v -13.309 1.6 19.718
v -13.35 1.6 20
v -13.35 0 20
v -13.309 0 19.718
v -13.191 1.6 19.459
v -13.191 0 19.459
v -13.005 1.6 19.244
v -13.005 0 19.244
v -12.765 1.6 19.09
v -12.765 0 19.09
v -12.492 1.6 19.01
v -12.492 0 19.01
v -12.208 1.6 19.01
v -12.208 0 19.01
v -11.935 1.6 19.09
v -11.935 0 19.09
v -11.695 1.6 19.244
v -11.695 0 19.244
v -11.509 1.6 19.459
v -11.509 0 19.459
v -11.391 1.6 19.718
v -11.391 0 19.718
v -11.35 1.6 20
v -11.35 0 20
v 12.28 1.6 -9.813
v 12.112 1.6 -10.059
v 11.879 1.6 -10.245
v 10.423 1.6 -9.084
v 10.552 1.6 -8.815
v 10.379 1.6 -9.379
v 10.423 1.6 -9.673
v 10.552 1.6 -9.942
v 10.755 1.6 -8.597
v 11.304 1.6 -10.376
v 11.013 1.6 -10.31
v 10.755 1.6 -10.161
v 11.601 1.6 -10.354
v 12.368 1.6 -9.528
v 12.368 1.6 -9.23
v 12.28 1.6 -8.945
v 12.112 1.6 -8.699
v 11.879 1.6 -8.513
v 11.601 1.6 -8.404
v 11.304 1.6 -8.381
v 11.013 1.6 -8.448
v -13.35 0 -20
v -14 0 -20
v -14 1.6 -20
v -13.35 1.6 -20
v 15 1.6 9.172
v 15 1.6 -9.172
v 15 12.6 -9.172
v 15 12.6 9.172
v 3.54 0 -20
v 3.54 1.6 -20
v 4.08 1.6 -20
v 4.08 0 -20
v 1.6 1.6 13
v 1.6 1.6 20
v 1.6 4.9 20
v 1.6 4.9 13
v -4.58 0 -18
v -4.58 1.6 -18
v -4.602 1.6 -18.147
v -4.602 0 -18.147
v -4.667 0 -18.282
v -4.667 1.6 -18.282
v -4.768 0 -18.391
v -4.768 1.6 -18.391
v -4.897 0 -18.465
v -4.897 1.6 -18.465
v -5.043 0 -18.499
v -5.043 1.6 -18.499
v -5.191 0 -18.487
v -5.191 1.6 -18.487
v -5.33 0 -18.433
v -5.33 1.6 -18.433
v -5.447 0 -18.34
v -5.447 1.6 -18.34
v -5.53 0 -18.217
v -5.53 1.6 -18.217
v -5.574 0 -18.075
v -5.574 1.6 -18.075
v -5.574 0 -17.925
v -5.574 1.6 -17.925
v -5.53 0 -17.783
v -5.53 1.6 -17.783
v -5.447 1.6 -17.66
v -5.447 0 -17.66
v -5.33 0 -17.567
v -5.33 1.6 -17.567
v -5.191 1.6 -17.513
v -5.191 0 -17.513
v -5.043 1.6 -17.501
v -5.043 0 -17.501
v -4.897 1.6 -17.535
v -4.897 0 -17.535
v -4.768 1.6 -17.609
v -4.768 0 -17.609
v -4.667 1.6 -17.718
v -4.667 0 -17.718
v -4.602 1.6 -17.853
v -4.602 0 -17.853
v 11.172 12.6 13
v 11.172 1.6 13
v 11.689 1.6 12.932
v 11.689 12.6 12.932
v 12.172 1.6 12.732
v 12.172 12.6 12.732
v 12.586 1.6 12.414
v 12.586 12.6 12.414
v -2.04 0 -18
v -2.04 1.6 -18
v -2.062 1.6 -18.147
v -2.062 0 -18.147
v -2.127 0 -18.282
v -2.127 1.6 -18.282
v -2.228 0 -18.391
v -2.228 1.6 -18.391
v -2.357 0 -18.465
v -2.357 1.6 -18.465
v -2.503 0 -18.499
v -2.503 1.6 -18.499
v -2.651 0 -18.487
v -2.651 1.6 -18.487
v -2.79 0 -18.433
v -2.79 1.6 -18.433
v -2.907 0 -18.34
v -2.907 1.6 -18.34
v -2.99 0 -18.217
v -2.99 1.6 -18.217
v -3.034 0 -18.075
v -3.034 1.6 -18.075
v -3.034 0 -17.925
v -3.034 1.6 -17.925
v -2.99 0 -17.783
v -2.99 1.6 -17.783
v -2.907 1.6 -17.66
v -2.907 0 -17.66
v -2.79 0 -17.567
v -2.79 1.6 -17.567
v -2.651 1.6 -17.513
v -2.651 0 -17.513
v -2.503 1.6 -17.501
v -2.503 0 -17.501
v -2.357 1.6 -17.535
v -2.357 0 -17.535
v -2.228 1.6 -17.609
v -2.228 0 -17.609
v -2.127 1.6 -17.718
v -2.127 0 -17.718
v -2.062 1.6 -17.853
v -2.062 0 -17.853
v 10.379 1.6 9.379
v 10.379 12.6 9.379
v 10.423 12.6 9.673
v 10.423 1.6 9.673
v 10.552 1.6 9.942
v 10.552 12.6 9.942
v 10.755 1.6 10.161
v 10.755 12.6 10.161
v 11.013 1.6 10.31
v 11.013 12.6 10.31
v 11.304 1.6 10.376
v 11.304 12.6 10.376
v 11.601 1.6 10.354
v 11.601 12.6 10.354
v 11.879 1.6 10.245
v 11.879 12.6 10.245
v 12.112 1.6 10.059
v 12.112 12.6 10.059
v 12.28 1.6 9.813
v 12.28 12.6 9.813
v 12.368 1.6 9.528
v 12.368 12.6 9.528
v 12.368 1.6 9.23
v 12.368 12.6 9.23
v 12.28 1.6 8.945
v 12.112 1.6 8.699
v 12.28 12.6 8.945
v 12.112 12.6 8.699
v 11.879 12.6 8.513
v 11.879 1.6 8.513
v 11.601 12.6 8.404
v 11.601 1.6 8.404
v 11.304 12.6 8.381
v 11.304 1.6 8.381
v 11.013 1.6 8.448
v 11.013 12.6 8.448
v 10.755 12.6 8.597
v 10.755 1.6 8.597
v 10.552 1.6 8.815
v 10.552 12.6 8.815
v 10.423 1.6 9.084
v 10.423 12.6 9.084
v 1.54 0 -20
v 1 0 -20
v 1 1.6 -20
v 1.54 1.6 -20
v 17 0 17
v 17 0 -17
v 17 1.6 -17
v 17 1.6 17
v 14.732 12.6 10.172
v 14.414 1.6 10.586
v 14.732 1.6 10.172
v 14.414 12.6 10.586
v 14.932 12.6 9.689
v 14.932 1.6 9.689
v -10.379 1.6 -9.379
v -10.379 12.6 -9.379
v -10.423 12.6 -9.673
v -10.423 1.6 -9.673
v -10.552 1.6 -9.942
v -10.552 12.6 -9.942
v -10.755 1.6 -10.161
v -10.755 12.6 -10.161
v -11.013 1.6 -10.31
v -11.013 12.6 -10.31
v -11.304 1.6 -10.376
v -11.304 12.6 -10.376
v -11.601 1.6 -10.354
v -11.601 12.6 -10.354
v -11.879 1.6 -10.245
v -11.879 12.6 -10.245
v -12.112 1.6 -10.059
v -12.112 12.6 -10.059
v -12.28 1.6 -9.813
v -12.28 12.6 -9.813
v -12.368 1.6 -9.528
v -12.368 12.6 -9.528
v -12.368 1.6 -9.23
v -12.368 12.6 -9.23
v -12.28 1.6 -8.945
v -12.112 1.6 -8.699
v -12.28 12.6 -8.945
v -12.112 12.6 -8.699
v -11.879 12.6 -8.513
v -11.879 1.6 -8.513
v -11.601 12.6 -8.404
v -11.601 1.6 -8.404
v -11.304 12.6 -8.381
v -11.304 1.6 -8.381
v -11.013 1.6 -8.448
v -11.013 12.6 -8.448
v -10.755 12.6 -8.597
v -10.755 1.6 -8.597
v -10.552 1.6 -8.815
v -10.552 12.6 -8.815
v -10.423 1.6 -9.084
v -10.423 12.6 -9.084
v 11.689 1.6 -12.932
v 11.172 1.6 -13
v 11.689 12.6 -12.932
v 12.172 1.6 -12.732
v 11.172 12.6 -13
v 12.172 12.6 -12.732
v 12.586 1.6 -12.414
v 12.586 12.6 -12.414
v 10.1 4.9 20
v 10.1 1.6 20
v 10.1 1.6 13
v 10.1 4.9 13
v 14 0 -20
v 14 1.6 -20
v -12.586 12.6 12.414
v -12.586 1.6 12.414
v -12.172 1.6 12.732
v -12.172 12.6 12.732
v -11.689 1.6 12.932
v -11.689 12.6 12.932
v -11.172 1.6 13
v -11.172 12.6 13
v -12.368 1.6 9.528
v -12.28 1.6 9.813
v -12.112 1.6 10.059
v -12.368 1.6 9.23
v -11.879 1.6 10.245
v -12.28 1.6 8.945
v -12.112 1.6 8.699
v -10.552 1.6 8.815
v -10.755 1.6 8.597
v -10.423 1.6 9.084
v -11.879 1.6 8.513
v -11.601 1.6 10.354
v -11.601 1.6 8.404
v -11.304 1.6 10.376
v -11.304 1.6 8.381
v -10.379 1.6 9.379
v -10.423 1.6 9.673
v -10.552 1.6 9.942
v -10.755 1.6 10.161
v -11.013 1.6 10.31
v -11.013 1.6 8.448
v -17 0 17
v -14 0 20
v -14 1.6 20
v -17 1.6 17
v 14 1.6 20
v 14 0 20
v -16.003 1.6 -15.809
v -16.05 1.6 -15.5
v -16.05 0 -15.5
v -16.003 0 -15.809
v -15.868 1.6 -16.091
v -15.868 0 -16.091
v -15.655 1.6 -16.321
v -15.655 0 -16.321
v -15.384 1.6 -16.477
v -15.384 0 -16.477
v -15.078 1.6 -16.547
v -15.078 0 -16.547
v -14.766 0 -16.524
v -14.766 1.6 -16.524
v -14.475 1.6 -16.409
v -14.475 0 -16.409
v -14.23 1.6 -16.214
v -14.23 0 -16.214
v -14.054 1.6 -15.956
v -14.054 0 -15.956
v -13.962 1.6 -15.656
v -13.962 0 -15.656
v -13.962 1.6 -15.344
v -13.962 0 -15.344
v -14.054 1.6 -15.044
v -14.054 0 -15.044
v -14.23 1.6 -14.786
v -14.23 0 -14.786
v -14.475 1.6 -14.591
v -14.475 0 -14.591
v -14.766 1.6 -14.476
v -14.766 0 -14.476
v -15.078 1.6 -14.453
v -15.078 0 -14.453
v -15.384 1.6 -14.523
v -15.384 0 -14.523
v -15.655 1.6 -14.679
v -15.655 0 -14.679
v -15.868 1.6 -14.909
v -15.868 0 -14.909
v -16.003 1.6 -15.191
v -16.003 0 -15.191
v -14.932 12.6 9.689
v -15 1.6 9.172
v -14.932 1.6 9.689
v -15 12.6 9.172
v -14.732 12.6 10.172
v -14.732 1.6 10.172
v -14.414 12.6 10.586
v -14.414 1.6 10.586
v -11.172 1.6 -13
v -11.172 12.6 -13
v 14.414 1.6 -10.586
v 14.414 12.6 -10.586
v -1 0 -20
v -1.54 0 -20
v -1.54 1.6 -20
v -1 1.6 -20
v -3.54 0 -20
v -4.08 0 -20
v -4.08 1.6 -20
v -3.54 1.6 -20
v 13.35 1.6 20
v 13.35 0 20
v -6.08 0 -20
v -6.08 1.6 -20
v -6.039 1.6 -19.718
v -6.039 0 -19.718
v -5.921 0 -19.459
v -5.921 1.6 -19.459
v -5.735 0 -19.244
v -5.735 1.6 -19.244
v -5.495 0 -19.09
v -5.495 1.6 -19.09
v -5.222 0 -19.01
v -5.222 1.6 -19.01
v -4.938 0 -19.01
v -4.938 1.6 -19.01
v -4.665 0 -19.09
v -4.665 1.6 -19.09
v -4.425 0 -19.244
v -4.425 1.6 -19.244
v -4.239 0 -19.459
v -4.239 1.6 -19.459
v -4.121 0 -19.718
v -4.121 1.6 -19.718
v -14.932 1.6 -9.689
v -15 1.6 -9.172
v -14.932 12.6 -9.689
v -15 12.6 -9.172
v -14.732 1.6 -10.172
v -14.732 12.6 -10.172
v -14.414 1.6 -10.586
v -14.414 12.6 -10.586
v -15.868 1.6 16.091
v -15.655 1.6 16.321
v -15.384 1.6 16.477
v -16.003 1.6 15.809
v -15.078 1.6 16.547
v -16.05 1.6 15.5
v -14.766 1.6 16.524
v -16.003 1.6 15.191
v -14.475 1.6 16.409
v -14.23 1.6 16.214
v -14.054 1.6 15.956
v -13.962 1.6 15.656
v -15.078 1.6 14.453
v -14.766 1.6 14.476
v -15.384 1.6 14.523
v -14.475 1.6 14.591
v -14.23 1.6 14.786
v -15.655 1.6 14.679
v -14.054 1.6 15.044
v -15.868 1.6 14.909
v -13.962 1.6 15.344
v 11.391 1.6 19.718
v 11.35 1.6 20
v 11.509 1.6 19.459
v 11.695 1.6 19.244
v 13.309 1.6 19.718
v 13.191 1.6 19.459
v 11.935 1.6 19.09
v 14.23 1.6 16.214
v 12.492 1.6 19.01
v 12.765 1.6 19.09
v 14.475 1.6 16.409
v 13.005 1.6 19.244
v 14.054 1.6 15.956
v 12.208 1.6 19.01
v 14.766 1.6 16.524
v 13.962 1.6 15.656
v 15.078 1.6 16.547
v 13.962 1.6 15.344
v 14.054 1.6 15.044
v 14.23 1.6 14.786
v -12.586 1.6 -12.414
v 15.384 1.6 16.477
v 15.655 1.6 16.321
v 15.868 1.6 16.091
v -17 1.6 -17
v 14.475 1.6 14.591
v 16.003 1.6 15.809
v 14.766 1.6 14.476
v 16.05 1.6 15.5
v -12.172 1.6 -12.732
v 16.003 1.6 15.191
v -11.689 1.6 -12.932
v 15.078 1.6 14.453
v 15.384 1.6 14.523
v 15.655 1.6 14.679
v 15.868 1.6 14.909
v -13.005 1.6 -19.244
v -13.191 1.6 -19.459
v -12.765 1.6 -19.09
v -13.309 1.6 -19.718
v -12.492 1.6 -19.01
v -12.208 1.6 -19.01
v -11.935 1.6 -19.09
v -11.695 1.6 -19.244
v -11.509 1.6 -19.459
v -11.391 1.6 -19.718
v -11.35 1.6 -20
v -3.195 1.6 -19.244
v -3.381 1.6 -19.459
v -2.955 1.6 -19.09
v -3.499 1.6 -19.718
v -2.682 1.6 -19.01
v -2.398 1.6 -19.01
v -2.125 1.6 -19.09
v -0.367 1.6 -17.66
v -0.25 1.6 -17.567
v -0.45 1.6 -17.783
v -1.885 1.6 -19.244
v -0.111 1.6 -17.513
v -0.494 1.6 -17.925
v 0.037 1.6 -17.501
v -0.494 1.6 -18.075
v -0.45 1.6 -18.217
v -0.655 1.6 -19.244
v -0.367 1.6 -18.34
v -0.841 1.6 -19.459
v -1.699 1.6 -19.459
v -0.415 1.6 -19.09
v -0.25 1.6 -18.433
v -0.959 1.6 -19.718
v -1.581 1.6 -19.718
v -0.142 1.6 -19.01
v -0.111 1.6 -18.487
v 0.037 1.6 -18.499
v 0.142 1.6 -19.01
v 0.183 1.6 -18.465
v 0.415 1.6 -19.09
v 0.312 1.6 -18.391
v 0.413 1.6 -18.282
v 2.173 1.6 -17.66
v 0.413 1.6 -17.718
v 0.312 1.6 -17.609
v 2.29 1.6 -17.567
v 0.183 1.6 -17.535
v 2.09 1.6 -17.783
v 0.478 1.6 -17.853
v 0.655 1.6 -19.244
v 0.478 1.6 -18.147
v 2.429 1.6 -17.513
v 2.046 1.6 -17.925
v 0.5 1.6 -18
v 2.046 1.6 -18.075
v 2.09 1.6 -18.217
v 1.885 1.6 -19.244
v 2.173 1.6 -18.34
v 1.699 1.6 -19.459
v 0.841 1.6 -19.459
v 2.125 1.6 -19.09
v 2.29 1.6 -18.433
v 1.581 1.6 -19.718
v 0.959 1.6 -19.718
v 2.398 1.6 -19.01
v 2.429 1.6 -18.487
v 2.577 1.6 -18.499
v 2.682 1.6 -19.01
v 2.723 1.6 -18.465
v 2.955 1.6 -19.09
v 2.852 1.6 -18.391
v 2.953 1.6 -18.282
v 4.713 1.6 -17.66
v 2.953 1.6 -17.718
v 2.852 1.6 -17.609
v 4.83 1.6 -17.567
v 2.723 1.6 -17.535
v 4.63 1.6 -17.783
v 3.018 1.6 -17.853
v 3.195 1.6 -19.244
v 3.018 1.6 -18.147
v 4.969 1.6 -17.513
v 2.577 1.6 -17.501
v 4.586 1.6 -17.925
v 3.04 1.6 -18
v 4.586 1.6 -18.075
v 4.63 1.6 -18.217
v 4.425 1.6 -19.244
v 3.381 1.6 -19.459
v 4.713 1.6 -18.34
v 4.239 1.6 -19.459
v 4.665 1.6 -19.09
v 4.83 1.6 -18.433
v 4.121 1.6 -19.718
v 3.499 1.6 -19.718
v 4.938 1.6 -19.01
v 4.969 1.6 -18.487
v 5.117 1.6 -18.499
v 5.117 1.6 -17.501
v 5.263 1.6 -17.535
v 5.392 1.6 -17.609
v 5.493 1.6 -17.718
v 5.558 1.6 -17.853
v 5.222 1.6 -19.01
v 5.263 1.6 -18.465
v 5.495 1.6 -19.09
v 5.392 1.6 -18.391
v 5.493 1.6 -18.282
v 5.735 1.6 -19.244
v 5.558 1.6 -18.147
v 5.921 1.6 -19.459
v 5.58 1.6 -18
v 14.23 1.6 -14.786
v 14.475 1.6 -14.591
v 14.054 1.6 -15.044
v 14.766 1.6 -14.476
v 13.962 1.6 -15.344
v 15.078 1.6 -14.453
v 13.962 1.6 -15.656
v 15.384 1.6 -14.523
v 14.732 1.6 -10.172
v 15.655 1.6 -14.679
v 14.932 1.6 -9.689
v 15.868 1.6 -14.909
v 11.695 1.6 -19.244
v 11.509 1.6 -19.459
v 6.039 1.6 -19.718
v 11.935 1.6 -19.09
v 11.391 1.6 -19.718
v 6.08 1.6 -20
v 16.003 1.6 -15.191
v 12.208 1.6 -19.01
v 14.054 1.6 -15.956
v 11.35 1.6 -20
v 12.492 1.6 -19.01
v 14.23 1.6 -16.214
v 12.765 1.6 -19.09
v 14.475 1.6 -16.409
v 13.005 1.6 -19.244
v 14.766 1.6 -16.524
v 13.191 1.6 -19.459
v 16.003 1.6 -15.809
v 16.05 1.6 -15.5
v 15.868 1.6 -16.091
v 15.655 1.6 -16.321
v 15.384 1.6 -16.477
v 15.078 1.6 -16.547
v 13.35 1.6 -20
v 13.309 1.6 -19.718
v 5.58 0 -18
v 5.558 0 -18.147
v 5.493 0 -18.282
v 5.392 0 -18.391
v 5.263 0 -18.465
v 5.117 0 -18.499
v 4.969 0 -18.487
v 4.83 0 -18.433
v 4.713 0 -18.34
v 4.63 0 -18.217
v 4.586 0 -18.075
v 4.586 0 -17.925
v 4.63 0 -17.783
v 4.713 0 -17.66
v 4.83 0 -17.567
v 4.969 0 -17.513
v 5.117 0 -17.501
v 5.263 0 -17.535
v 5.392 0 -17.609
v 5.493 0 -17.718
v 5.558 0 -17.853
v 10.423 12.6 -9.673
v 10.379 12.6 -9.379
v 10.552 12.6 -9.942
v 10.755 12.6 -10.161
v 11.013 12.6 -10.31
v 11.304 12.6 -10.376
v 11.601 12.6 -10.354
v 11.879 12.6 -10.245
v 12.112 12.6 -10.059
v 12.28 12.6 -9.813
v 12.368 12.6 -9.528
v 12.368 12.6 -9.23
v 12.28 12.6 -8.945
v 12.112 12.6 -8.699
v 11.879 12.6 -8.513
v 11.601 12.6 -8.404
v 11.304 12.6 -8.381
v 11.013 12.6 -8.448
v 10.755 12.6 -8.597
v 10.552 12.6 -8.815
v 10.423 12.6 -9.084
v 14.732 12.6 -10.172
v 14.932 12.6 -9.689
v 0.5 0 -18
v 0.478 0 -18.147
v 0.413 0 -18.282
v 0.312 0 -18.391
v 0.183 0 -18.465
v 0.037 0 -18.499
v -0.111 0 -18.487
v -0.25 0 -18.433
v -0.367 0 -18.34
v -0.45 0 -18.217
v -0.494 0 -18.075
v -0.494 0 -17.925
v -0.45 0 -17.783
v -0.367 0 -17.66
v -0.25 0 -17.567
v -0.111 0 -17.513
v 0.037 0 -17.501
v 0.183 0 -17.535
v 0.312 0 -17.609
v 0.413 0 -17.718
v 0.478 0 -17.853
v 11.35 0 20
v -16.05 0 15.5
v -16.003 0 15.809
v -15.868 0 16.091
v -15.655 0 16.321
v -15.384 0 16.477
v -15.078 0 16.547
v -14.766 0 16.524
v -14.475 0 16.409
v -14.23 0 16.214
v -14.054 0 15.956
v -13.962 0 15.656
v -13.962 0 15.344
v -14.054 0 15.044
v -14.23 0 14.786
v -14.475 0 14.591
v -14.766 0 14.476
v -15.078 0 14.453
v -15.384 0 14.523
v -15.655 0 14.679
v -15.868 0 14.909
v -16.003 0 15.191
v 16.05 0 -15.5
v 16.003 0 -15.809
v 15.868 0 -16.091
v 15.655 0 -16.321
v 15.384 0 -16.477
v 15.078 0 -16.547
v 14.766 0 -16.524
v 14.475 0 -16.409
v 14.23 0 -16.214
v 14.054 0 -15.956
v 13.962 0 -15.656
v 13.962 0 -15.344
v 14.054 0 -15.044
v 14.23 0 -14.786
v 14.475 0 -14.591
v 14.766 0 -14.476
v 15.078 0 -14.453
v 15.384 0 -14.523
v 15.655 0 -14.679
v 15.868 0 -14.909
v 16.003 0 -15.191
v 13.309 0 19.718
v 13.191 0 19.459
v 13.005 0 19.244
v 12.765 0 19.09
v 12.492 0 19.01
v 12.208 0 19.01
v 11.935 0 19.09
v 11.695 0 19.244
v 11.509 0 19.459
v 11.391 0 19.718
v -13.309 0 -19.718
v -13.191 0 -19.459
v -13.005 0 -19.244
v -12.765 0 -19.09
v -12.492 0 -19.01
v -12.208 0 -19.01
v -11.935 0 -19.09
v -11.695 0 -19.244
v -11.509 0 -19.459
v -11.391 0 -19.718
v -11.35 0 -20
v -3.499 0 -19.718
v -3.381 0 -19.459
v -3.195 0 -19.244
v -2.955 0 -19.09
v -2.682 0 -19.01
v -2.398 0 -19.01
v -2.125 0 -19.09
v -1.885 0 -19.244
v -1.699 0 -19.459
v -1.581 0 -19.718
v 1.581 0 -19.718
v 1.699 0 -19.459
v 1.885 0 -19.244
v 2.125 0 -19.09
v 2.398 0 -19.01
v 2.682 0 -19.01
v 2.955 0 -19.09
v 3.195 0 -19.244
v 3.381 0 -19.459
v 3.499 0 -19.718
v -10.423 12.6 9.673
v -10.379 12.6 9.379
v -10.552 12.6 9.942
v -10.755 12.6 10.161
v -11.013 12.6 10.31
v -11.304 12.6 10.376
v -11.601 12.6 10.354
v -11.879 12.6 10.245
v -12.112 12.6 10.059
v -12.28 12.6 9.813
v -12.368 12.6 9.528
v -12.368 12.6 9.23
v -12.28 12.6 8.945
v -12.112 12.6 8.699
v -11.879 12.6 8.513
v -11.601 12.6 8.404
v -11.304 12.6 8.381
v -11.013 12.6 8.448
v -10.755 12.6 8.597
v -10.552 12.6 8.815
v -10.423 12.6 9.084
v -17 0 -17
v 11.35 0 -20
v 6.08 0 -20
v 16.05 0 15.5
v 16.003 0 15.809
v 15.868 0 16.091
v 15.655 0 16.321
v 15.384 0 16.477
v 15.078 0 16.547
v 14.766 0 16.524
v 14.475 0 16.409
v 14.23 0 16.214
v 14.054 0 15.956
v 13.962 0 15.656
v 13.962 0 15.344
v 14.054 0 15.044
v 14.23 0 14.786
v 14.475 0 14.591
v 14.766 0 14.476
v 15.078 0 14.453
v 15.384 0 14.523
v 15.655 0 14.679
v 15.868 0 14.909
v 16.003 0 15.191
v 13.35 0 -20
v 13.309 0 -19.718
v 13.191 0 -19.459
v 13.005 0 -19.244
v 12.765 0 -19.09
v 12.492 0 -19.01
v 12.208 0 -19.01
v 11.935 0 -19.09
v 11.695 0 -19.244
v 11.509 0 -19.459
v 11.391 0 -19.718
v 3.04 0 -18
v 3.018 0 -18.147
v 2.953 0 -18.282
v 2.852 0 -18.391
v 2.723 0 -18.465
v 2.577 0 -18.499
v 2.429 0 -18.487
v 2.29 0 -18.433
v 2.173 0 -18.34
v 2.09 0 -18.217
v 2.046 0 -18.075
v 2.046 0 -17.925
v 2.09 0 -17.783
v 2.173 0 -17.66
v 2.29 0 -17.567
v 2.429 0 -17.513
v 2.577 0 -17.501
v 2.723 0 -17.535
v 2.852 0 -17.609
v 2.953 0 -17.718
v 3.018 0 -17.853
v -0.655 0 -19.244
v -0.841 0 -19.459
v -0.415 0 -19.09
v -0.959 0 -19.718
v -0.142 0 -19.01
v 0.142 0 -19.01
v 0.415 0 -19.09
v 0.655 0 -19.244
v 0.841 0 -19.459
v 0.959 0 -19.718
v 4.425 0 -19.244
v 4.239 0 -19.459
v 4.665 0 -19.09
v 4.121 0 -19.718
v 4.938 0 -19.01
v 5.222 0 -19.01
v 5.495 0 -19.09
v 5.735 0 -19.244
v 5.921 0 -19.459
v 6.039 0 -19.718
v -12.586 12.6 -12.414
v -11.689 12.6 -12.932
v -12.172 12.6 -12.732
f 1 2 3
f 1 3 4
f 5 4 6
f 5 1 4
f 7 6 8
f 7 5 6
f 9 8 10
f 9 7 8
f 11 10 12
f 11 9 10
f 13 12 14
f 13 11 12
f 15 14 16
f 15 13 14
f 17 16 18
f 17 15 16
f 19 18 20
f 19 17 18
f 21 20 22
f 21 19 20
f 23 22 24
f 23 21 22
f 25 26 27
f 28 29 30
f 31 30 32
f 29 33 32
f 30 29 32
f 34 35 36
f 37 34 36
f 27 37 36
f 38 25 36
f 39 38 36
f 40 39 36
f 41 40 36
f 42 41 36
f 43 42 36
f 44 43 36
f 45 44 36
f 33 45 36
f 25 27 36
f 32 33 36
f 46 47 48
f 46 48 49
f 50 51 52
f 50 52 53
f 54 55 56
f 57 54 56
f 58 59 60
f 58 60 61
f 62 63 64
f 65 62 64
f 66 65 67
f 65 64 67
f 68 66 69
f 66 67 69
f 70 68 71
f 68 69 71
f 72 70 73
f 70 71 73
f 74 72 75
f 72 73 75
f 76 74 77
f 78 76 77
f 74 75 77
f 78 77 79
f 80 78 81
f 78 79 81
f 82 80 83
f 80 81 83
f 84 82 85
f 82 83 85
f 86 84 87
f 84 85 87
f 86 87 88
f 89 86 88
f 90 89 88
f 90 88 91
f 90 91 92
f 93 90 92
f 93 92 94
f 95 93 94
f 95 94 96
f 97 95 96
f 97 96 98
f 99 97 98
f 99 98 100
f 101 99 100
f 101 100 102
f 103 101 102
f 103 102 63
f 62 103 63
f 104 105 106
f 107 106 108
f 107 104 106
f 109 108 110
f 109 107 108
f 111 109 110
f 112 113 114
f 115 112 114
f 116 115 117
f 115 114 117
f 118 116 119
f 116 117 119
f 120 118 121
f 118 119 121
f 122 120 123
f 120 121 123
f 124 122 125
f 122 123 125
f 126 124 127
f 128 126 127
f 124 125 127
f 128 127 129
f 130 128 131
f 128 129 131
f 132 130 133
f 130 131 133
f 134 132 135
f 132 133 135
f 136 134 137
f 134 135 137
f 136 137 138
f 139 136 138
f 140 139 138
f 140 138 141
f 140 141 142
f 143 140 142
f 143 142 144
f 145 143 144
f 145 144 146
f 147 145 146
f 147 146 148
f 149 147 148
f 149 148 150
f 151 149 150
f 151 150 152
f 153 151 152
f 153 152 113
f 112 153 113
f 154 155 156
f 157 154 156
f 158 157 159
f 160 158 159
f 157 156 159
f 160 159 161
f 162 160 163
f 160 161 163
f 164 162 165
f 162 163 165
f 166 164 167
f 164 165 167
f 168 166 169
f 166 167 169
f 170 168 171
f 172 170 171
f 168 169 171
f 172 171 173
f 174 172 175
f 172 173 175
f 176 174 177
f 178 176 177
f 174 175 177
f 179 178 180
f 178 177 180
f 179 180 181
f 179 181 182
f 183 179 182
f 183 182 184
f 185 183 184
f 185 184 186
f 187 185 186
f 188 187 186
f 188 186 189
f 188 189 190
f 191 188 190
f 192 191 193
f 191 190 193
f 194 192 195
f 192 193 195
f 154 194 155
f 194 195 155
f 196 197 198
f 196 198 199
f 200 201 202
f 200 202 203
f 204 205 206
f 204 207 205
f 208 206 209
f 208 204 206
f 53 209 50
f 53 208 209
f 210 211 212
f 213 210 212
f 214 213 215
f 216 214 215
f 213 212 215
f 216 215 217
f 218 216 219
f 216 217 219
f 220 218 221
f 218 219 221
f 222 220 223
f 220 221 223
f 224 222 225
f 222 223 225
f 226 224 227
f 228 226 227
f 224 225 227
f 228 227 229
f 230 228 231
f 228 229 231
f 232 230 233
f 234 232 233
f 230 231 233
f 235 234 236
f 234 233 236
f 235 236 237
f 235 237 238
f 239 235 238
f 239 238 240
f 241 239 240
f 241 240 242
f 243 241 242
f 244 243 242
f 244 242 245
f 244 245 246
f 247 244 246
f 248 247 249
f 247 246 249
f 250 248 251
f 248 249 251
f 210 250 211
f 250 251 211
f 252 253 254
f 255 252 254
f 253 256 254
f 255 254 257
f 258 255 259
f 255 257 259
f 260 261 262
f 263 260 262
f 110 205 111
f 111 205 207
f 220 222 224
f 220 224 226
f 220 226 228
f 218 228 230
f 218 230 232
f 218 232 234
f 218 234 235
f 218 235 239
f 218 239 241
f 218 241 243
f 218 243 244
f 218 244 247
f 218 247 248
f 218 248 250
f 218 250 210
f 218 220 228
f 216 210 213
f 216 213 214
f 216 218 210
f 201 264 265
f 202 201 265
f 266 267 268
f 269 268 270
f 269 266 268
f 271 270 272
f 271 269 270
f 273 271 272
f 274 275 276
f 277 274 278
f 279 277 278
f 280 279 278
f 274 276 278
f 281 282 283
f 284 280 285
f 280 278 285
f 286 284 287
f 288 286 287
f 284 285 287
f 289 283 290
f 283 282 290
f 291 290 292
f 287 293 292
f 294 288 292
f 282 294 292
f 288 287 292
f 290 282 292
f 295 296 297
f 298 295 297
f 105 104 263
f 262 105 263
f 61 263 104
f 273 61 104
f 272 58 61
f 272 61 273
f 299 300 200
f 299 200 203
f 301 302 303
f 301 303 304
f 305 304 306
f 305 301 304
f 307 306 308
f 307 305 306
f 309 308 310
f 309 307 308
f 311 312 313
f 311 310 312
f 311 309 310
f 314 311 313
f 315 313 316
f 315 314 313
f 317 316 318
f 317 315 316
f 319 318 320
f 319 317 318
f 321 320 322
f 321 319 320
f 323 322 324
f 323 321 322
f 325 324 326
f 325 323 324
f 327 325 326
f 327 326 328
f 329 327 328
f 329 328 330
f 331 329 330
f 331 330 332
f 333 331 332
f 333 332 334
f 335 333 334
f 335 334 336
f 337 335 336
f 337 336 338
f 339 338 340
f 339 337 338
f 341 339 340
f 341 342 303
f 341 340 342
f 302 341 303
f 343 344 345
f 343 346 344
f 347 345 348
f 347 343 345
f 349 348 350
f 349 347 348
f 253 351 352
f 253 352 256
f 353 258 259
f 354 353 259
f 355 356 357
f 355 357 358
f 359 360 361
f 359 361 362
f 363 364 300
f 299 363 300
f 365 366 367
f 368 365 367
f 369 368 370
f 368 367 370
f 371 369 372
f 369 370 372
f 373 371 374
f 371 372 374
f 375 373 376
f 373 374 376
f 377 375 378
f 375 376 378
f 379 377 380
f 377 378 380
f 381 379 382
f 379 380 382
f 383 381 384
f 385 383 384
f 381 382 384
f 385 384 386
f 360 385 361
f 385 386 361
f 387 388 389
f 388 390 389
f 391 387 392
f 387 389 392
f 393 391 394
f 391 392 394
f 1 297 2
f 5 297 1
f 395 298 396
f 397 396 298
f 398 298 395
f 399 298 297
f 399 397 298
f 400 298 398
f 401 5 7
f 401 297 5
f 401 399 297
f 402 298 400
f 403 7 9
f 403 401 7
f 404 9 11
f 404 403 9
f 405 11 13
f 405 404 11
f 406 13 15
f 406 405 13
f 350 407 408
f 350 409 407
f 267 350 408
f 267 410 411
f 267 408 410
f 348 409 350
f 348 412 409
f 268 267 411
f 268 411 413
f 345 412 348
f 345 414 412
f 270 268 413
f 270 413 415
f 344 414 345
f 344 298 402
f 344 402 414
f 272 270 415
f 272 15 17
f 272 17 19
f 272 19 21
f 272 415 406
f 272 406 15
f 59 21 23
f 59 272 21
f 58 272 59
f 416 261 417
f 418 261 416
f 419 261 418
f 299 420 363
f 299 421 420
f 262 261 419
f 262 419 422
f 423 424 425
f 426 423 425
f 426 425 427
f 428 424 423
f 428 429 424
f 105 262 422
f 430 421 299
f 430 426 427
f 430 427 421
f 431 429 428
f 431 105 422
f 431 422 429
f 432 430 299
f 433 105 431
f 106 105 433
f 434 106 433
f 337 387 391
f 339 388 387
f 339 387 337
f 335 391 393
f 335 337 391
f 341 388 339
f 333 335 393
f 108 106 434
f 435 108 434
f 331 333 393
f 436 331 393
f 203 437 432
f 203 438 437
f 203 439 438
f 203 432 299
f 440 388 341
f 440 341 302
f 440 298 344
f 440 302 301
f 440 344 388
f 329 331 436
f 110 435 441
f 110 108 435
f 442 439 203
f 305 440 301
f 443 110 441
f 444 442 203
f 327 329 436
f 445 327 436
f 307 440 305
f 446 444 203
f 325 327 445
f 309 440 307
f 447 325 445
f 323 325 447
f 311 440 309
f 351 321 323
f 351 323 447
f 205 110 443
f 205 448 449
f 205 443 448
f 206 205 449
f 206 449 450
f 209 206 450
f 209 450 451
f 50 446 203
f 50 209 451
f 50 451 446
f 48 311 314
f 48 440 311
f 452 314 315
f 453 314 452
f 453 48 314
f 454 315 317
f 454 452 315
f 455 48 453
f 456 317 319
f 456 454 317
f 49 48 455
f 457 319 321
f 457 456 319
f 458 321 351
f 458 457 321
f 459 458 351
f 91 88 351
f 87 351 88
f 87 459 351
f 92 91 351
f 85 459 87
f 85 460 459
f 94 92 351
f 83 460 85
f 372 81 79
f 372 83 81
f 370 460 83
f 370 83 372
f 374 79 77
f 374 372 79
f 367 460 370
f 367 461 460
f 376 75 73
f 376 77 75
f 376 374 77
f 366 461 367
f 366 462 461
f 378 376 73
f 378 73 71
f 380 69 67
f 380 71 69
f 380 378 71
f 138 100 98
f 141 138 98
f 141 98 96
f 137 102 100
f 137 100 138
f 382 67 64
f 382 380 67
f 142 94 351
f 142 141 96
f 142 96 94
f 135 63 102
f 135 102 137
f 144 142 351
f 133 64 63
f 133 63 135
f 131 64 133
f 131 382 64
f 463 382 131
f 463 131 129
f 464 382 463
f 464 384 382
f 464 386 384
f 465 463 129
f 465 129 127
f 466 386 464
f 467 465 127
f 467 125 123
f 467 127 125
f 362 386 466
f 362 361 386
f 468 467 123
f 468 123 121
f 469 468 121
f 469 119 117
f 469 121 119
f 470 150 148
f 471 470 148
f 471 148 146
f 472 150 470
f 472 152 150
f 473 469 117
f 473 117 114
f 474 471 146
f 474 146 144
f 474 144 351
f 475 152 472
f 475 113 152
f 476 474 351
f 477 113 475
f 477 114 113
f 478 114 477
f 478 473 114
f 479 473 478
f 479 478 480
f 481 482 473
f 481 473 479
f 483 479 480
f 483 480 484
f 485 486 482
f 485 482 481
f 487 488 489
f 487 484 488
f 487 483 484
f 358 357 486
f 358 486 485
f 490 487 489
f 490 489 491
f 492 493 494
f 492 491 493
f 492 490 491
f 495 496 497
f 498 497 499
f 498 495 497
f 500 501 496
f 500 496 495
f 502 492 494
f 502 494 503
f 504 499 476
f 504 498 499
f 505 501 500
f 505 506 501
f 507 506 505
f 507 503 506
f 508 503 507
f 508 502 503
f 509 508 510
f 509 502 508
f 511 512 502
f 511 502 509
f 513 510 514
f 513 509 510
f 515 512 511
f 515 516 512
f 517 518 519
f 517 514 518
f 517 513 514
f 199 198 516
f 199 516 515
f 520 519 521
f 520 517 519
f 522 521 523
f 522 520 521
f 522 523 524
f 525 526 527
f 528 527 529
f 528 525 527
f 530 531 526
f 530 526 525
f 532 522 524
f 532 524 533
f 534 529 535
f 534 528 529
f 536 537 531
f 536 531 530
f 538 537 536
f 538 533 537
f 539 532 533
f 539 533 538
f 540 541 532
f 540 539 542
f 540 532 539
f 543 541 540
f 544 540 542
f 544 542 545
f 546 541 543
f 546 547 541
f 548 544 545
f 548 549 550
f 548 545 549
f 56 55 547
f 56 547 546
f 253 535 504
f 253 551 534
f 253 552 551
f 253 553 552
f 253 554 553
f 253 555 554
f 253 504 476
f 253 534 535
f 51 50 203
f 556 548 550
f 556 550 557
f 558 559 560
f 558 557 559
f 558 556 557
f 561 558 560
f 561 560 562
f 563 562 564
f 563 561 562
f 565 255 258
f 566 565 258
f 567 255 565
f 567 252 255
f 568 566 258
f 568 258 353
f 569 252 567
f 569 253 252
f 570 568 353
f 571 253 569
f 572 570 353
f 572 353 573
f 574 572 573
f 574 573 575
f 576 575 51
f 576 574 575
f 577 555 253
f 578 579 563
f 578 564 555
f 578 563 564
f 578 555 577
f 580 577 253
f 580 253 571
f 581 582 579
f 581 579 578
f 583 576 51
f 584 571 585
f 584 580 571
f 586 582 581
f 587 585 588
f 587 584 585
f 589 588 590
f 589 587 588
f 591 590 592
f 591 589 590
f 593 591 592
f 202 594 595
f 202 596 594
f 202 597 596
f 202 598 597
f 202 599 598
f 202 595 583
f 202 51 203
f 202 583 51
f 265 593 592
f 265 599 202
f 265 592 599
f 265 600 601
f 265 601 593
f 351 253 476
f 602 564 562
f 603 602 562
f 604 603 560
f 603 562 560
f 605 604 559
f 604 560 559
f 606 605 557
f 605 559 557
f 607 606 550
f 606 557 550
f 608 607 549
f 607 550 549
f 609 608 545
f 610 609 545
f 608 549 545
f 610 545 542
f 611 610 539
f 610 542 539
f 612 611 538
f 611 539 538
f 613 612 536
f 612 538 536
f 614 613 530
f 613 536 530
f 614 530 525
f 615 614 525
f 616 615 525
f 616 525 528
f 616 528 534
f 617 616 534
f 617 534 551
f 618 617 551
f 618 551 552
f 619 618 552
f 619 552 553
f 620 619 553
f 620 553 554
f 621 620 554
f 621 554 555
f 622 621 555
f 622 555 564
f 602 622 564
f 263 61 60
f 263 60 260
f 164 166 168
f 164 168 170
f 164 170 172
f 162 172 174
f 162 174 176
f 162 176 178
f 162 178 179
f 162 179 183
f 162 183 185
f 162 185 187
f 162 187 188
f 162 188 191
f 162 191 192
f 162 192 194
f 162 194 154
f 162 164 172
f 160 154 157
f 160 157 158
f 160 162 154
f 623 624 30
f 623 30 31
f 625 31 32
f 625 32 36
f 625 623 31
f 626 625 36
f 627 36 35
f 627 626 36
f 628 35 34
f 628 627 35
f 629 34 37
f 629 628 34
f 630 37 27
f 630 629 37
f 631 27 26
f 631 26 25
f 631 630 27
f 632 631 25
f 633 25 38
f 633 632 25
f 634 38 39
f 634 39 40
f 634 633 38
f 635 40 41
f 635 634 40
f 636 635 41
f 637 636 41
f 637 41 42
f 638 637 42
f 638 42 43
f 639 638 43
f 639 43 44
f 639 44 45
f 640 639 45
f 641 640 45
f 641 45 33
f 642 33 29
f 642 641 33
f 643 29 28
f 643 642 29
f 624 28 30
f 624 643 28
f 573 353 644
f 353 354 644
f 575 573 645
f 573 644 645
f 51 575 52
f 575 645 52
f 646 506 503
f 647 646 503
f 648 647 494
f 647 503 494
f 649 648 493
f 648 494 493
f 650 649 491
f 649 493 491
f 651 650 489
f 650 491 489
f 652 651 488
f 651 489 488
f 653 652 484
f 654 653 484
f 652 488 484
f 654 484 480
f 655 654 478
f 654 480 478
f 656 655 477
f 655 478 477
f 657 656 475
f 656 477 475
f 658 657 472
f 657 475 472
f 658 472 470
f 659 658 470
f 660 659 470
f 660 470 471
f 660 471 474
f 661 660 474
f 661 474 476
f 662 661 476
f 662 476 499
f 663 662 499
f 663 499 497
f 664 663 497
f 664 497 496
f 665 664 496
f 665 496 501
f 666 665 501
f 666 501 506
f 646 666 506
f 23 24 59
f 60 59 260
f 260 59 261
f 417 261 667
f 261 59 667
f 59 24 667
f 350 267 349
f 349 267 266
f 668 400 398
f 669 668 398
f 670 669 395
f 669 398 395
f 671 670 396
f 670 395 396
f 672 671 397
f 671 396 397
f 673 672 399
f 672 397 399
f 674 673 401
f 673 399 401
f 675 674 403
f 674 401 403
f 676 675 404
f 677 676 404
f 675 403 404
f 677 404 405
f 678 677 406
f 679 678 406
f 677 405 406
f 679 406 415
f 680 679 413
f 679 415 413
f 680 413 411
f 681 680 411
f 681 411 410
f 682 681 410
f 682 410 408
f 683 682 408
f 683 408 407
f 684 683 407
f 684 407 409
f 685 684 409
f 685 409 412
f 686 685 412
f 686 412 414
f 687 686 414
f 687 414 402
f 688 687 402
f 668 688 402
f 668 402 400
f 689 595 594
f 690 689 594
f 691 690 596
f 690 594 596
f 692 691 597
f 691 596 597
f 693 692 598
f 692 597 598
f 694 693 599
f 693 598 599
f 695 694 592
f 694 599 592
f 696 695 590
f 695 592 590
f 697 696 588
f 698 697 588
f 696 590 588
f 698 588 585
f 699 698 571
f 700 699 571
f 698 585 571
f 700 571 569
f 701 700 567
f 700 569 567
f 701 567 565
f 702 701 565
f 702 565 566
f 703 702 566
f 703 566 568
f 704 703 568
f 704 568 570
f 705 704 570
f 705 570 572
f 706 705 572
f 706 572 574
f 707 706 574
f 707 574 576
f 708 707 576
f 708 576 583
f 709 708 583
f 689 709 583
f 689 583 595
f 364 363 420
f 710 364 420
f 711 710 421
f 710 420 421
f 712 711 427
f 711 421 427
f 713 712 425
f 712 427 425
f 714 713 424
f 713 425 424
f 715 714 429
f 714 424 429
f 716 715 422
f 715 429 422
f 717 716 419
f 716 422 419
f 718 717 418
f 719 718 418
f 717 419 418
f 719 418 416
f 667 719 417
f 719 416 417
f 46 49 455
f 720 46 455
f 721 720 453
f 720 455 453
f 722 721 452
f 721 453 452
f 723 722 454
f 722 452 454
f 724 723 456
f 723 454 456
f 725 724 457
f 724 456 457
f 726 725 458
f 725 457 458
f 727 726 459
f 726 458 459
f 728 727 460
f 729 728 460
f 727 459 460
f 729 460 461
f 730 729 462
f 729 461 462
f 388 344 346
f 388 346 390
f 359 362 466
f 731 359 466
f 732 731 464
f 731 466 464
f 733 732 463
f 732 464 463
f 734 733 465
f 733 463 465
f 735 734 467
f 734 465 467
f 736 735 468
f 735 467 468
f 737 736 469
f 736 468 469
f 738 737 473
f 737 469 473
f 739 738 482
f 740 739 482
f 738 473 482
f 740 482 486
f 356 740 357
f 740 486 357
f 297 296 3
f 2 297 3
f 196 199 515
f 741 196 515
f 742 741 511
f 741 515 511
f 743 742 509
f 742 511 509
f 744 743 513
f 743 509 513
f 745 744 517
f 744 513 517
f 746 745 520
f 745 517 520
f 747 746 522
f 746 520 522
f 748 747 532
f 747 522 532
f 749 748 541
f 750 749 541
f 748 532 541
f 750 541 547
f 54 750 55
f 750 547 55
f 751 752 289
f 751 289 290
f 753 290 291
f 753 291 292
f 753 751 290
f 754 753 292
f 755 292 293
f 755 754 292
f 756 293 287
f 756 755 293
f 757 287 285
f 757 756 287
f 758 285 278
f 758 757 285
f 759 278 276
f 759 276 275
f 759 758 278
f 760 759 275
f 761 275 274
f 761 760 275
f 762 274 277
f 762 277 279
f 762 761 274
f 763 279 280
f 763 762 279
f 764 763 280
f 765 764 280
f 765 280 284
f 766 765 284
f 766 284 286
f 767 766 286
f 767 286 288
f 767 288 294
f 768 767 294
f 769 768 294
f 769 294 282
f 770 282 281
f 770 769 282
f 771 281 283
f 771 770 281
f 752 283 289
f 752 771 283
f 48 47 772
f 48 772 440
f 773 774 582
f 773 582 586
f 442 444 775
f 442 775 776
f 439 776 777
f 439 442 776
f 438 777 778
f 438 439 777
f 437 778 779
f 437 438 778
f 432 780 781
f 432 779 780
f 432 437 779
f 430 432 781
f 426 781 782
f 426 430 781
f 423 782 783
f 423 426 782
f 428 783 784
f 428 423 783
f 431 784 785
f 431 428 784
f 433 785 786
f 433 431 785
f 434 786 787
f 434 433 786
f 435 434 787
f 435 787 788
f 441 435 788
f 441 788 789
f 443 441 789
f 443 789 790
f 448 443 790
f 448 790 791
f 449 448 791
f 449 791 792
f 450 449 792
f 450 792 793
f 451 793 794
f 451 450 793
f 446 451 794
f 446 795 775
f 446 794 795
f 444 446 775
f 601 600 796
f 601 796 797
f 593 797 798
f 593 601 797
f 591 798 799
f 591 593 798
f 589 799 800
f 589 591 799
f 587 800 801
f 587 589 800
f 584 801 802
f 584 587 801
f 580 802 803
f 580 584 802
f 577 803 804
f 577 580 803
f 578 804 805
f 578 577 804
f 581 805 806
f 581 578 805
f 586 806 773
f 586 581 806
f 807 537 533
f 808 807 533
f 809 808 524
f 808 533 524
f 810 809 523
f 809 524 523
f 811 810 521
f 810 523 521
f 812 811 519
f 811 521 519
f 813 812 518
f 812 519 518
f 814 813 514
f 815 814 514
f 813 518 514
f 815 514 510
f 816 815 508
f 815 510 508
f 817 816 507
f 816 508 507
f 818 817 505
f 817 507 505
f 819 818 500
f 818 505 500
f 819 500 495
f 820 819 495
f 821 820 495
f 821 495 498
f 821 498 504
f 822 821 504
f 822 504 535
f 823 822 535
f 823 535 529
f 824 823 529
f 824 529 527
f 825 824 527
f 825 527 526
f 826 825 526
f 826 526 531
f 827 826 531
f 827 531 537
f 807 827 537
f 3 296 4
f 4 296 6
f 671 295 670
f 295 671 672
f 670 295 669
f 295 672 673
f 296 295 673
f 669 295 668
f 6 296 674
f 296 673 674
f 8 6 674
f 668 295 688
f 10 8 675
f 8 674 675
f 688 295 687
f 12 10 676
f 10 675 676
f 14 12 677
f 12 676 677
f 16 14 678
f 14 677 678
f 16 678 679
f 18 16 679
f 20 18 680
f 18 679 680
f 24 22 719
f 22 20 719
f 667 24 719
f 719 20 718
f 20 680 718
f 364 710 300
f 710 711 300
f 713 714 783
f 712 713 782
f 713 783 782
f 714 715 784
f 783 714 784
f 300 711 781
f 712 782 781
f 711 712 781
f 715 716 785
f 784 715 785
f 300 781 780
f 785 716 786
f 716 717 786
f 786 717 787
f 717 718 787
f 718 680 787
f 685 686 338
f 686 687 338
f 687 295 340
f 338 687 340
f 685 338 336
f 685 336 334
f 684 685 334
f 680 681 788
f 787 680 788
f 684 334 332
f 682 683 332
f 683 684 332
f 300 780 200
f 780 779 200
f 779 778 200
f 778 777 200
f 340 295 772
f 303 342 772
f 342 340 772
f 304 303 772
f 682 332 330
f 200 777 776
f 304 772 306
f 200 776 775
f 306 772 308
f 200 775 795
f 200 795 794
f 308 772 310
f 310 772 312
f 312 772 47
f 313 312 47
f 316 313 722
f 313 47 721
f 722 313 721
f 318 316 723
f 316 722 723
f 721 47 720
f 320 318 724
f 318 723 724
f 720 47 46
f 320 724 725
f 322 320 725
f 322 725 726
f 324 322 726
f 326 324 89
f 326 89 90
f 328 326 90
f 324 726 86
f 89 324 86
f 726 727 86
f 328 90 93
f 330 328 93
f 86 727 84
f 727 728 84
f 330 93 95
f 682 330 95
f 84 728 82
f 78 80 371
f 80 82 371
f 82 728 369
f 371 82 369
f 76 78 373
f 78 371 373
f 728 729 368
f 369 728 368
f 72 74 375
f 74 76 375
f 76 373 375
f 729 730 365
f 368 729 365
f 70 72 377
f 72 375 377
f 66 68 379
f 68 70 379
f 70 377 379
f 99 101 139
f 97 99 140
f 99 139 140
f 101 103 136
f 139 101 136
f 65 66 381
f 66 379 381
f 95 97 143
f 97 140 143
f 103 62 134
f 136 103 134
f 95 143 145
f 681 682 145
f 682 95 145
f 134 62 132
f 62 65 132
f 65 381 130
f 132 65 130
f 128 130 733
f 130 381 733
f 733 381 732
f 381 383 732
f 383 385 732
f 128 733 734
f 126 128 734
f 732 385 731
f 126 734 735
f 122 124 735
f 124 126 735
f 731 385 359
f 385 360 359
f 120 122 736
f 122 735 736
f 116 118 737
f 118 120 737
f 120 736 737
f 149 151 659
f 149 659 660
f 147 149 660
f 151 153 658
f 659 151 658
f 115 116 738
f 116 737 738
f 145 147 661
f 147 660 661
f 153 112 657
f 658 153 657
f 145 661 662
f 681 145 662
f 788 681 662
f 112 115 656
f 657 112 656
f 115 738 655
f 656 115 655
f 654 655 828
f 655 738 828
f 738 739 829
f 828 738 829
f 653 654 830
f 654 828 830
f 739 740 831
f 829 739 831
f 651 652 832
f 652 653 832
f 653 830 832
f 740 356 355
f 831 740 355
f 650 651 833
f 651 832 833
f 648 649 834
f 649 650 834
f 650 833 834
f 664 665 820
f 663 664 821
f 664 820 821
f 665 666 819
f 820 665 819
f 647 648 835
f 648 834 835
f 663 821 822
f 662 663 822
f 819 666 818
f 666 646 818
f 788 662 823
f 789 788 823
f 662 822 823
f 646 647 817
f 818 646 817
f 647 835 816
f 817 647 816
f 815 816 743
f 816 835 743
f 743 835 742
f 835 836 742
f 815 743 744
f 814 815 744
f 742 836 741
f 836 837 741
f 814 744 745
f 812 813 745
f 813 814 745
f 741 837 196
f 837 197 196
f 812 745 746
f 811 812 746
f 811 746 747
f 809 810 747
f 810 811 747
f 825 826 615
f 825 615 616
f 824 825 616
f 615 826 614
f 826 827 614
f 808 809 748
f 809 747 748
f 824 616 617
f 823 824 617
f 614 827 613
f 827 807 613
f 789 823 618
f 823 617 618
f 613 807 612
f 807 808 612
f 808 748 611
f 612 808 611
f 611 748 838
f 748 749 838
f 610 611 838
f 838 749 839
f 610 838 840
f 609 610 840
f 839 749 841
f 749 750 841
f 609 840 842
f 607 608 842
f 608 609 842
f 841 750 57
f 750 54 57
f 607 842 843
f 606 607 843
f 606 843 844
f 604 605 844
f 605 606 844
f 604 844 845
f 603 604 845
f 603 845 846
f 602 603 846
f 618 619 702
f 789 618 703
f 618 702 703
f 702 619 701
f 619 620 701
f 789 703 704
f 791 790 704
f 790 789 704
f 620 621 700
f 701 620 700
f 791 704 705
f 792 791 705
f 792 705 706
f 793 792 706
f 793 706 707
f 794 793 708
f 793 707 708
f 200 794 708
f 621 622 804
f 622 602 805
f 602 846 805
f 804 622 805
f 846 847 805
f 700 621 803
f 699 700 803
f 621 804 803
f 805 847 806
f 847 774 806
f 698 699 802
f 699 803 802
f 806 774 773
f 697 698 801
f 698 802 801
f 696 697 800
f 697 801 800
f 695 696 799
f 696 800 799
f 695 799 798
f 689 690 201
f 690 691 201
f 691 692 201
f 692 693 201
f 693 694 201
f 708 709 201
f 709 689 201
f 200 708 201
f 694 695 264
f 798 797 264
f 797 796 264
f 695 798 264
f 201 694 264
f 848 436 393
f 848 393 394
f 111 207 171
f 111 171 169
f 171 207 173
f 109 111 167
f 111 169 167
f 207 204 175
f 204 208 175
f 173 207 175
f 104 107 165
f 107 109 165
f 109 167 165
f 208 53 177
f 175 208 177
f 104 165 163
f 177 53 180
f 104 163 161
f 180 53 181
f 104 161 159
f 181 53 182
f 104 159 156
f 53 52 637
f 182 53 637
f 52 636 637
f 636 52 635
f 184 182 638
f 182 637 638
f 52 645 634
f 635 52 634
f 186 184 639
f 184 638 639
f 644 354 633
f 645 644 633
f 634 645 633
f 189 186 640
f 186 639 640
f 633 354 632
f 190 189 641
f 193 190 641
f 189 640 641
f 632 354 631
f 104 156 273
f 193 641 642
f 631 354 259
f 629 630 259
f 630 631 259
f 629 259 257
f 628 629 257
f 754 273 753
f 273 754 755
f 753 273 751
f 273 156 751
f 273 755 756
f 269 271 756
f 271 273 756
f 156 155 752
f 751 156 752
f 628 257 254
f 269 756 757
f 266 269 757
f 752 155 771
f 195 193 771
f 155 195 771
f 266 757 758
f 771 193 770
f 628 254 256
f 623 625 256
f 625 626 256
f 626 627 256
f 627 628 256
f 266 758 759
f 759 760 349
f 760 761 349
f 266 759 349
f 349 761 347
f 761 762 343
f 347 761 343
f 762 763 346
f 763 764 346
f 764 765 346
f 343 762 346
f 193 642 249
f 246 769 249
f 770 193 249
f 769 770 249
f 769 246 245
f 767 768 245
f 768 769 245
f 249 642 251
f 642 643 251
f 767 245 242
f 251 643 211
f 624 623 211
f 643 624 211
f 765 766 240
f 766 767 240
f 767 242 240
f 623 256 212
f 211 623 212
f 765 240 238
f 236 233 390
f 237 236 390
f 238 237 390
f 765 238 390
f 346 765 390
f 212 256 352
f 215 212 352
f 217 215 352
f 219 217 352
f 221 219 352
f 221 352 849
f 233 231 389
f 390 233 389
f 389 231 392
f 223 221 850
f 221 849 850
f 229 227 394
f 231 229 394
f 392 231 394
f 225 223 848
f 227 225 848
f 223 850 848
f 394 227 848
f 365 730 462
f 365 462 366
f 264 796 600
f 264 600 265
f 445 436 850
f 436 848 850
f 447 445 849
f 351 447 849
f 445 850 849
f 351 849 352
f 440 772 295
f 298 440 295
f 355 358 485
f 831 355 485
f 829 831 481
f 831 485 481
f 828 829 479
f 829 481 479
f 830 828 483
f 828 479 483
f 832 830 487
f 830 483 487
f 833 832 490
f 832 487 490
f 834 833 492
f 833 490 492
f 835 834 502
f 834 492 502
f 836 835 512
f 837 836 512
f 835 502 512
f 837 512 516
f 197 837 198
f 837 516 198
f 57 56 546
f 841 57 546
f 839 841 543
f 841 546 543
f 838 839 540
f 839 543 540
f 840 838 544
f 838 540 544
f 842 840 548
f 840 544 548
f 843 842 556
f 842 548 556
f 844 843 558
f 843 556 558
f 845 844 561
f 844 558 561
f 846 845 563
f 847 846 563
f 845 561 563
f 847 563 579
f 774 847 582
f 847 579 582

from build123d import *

# Parameters (mm, degrees)
BOSS_EXTRUDE1_DEPTH                        = 1.6
CHAMFER1_SIZE                              = 3
BOSS_EXTRUDE2_DEPTH                        = 11
CHAMFER2_SIZE                              = 3
FILLET1_R                                  = 2
SKETCH3_R                                  = 1
CUT_EXTRUDE1_DEPTH                         = 11
SKETCH4_R                                  = 1.05
CUT_EXTRUDE2_DEPTH                         = 13.6
SKETCH5_R                                  = 1
CUT_EXTRUDE3_DEPTH                         = 2.6
MIRROR1_AT_THE_SECOND_PLANE_COPY_1_SKETC_R = 1
MIRROR1_AT_THE_SECOND_PLANE_COPY_1_DEPTH   = 11
MIRROR1_AT_THE_SECOND_PLANE_COPY_2_SKETC_R = 1.05
MIRROR1_AT_THE_SECOND_PLANE_COPY_2_DEPTH   = 13.6
MIRROR1_AT_THE_SECOND_PLANE_COPY_3_SKETC_R = 1
MIRROR1_AT_THE_SECOND_PLANE_COPY_3_DEPTH   = 2.6
SKETCH6_W                                  = 8.5
SKETCH6_H                                  = 7
BOSS_EXTRUDE3_DEPTH                        = 3.3
SKETCH7_R                                  = 0.5
SKETCH7_R_2                                = 1
CUT_EXTRUDE4_DEPTH                         = 2.6
LPATTERN1_COUNT                            = 3
LPATTERN1_PITCH                            = 2.54
LPATTERN1_COL_COUNT                        = 3
LPATTERN1_COL_PITCH                        = 2.54


with BuildPart() as part:
    # Sketch1 → Boss-Extrude1 (new body)
    with BuildSketch(Plane(origin=(0, 0, 0), x_dir=(1, 0, 0), z_dir=(0, 1, 0))):
        Polygon((-17, 20), (-17, -20), (17, -20), align=None)
        Polygon((17, 20), (17, -20), (-17, 20), align=None)
    extrude(amount=BOSS_EXTRUDE1_DEPTH)

    # Chamfer1
    chamfer1_edges = [part.edges().sort_by_distance(p)[0] for p in [
        (-17, 0.8, -20),
        (17, 0.8, -20),
        (17, 0.8, 20),
        (-17, 0.8, 20),
    ]]
    chamfer(chamfer1_edges, length=CHAMFER1_SIZE)

    # Sketch2 → Boss-Extrude2 (add)
    with BuildSketch(Plane(origin=(0, 1.6, 0), x_dir=(1, 0, 0), z_dir=(0, 1, 0))):
        Polygon((-15, 13), (15, 13), (15, -13), align=None)
        Polygon((-15, 13), (15, -13), (-15, -13), align=None)
    extrude(amount=BOSS_EXTRUDE2_DEPTH)

    # Chamfer2
    chamfer2_edges = [part.edges().sort_by_distance(p)[0] for p in [
        (15, 7.1, -13),
        (-15, 7.1, -13),
        (-15, 7.1, 13),
        (15, 7.1, 13),
    ]]
    chamfer(chamfer2_edges, length=CHAMFER2_SIZE)

    # Fillet1
    fillet1_edges = [part.edges().sort_by_distance(p)[0] for p in [
        (-15, 7.1, 10),
        (-15, 7.1, -10),
        (12, 7.1, -13),
        (-12, 7.1, -13),
        (15, 7.1, 10),
        (15, 7.1, -10),
        (-12, 7.1, 13),
        (12, 7.1, 13),
    ]]
    fillet(fillet1_edges, radius=FILLET1_R)

    # Sketch3 → Cut-Extrude1 (cut)
    with BuildSketch(Plane(origin=(0, 12.6, 0), x_dir=(1, 0, 0), z_dir=(0, 1, 0))):
        with Locations((-11.378679656, 9.378679656)):
            Circle(SKETCH3_R)
    cut_extrude1 = extrude(amount=-CUT_EXTRUDE1_DEPTH, mode=Mode.SUBTRACT)

    # Sketch4 → Cut-Extrude2 (cut, through all)
    with BuildSketch(Plane(origin=(0, 12.6, 0), x_dir=(1, 0, 0), z_dir=(0, 1, 0))):
        with Locations((15, 15.5)):
            Circle(SKETCH4_R)
    cut_extrude2 = extrude(amount=-CUT_EXTRUDE2_DEPTH, mode=Mode.SUBTRACT)

    # Sketch5 → Cut-Extrude3 (cut, through all)
    with BuildSketch(Plane(origin=(0, 1.6, 0), x_dir=(1, 0, 0), z_dir=(0, 1, 0))):
        with Locations((-12.35, 20)):
            Circle(SKETCH5_R)
    cut_extrude3 = extrude(amount=-CUT_EXTRUDE3_DEPTH, mode=Mode.SUBTRACT)

    # Mirror1: Cut-Extrude1, Cut-Extrude2, Cut-Extrude3 across plane
    add(cut_extrude1.mirror(Plane.XY), mode=Mode.SUBTRACT)
    add(cut_extrude2.mirror(Plane.XY), mode=Mode.SUBTRACT)
    add(cut_extrude3.mirror(Plane.XY), mode=Mode.SUBTRACT)

    # Mirror1 at the second plane: Cut-Extrude3, Cut-Extrude1, Cut-Extrude2 across plane
    add(cut_extrude3.mirror(Plane(origin=(0, 0, 0), x_dir=(0, 0, 1), z_dir=(1, 0, 0))), mode=Mode.SUBTRACT)
    add(cut_extrude1.mirror(Plane(origin=(0, 0, 0), x_dir=(0, 0, 1), z_dir=(1, 0, 0))), mode=Mode.SUBTRACT)
    add(cut_extrude2.mirror(Plane(origin=(0, 0, 0), x_dir=(0, 0, 1), z_dir=(1, 0, 0))), mode=Mode.SUBTRACT)

    # Mirror1 at the second plane copy 1 sketc → Mirror1 at the second plane copy 1 (cut)
    with BuildSketch(Plane(origin=(0, 12.6, 0), x_dir=(-1, 0, 0), z_dir=(0, 1, 0))):
        with Locations((-11.378679656, 9.378679656)):
            Circle(MIRROR1_AT_THE_SECOND_PLANE_COPY_1_SKETC_R)
    extrude(amount=-MIRROR1_AT_THE_SECOND_PLANE_COPY_1_DEPTH, mode=Mode.SUBTRACT)

    # Mirror1 at the second plane copy 2 sketc → Mirror1 at the second plane copy 2 (cut, through all)
    with BuildSketch(Plane(origin=(0, 12.6, 0), x_dir=(-1, 0, 0), z_dir=(0, 1, 0))):
        with Locations((15, 15.5)):
            Circle(MIRROR1_AT_THE_SECOND_PLANE_COPY_2_SKETC_R)
    extrude(amount=-MIRROR1_AT_THE_SECOND_PLANE_COPY_2_DEPTH, mode=Mode.SUBTRACT)

    # Mirror1 at the second plane copy 3 sketc → Mirror1 at the second plane copy 3 (cut, through all)
    with BuildSketch(Plane(origin=(0, 1.6, 0), x_dir=(-1, 0, 0), z_dir=(0, 1, 0))):
        with Locations((-12.35, 20)):
            Circle(MIRROR1_AT_THE_SECOND_PLANE_COPY_3_SKETC_R)
    extrude(amount=-MIRROR1_AT_THE_SECOND_PLANE_COPY_3_DEPTH, mode=Mode.SUBTRACT)

    # Sketch6 → Boss-Extrude3 (add)
    with BuildSketch(Plane(origin=(0, 1.6, 0), x_dir=(1, 0, 0), z_dir=(0, 1, 0))):
        with Locations((5.85, -16.5)):
            Rectangle(SKETCH6_W, SKETCH6_H)
    extrude(amount=BOSS_EXTRUDE3_DEPTH)

    # Sketch7 → Cut-Extrude4 (cut, through all)
    with BuildSketch(Plane(origin=(0, 1.6, 0), x_dir=(1, 0, 0), z_dir=(0, 1, 0))):
        with Locations((0, 18)):
            Circle(SKETCH7_R)
        with Locations((0, 20)):
            Circle(SKETCH7_R_2)
    cut_extrude4 = extrude(amount=-CUT_EXTRUDE4_DEPTH, mode=Mode.SUBTRACT)

    # LPattern1: Cut-Extrude4 ×3
    with Locations(*[(i * LPATTERN1_PITCH, 0, 0) for i in range(1, LPATTERN1_COUNT)]):
        add(cut_extrude4, mode=Mode.SUBTRACT)

    # LPattern1 col: Cut-Extrude4 ×3
    with Locations(*[(-i * LPATTERN1_COL_PITCH, 0, 0) for i in range(1, LPATTERN1_COL_COUNT)]):
        add(cut_extrude4, mode=Mode.SUBTRACT)


solid = part.part
